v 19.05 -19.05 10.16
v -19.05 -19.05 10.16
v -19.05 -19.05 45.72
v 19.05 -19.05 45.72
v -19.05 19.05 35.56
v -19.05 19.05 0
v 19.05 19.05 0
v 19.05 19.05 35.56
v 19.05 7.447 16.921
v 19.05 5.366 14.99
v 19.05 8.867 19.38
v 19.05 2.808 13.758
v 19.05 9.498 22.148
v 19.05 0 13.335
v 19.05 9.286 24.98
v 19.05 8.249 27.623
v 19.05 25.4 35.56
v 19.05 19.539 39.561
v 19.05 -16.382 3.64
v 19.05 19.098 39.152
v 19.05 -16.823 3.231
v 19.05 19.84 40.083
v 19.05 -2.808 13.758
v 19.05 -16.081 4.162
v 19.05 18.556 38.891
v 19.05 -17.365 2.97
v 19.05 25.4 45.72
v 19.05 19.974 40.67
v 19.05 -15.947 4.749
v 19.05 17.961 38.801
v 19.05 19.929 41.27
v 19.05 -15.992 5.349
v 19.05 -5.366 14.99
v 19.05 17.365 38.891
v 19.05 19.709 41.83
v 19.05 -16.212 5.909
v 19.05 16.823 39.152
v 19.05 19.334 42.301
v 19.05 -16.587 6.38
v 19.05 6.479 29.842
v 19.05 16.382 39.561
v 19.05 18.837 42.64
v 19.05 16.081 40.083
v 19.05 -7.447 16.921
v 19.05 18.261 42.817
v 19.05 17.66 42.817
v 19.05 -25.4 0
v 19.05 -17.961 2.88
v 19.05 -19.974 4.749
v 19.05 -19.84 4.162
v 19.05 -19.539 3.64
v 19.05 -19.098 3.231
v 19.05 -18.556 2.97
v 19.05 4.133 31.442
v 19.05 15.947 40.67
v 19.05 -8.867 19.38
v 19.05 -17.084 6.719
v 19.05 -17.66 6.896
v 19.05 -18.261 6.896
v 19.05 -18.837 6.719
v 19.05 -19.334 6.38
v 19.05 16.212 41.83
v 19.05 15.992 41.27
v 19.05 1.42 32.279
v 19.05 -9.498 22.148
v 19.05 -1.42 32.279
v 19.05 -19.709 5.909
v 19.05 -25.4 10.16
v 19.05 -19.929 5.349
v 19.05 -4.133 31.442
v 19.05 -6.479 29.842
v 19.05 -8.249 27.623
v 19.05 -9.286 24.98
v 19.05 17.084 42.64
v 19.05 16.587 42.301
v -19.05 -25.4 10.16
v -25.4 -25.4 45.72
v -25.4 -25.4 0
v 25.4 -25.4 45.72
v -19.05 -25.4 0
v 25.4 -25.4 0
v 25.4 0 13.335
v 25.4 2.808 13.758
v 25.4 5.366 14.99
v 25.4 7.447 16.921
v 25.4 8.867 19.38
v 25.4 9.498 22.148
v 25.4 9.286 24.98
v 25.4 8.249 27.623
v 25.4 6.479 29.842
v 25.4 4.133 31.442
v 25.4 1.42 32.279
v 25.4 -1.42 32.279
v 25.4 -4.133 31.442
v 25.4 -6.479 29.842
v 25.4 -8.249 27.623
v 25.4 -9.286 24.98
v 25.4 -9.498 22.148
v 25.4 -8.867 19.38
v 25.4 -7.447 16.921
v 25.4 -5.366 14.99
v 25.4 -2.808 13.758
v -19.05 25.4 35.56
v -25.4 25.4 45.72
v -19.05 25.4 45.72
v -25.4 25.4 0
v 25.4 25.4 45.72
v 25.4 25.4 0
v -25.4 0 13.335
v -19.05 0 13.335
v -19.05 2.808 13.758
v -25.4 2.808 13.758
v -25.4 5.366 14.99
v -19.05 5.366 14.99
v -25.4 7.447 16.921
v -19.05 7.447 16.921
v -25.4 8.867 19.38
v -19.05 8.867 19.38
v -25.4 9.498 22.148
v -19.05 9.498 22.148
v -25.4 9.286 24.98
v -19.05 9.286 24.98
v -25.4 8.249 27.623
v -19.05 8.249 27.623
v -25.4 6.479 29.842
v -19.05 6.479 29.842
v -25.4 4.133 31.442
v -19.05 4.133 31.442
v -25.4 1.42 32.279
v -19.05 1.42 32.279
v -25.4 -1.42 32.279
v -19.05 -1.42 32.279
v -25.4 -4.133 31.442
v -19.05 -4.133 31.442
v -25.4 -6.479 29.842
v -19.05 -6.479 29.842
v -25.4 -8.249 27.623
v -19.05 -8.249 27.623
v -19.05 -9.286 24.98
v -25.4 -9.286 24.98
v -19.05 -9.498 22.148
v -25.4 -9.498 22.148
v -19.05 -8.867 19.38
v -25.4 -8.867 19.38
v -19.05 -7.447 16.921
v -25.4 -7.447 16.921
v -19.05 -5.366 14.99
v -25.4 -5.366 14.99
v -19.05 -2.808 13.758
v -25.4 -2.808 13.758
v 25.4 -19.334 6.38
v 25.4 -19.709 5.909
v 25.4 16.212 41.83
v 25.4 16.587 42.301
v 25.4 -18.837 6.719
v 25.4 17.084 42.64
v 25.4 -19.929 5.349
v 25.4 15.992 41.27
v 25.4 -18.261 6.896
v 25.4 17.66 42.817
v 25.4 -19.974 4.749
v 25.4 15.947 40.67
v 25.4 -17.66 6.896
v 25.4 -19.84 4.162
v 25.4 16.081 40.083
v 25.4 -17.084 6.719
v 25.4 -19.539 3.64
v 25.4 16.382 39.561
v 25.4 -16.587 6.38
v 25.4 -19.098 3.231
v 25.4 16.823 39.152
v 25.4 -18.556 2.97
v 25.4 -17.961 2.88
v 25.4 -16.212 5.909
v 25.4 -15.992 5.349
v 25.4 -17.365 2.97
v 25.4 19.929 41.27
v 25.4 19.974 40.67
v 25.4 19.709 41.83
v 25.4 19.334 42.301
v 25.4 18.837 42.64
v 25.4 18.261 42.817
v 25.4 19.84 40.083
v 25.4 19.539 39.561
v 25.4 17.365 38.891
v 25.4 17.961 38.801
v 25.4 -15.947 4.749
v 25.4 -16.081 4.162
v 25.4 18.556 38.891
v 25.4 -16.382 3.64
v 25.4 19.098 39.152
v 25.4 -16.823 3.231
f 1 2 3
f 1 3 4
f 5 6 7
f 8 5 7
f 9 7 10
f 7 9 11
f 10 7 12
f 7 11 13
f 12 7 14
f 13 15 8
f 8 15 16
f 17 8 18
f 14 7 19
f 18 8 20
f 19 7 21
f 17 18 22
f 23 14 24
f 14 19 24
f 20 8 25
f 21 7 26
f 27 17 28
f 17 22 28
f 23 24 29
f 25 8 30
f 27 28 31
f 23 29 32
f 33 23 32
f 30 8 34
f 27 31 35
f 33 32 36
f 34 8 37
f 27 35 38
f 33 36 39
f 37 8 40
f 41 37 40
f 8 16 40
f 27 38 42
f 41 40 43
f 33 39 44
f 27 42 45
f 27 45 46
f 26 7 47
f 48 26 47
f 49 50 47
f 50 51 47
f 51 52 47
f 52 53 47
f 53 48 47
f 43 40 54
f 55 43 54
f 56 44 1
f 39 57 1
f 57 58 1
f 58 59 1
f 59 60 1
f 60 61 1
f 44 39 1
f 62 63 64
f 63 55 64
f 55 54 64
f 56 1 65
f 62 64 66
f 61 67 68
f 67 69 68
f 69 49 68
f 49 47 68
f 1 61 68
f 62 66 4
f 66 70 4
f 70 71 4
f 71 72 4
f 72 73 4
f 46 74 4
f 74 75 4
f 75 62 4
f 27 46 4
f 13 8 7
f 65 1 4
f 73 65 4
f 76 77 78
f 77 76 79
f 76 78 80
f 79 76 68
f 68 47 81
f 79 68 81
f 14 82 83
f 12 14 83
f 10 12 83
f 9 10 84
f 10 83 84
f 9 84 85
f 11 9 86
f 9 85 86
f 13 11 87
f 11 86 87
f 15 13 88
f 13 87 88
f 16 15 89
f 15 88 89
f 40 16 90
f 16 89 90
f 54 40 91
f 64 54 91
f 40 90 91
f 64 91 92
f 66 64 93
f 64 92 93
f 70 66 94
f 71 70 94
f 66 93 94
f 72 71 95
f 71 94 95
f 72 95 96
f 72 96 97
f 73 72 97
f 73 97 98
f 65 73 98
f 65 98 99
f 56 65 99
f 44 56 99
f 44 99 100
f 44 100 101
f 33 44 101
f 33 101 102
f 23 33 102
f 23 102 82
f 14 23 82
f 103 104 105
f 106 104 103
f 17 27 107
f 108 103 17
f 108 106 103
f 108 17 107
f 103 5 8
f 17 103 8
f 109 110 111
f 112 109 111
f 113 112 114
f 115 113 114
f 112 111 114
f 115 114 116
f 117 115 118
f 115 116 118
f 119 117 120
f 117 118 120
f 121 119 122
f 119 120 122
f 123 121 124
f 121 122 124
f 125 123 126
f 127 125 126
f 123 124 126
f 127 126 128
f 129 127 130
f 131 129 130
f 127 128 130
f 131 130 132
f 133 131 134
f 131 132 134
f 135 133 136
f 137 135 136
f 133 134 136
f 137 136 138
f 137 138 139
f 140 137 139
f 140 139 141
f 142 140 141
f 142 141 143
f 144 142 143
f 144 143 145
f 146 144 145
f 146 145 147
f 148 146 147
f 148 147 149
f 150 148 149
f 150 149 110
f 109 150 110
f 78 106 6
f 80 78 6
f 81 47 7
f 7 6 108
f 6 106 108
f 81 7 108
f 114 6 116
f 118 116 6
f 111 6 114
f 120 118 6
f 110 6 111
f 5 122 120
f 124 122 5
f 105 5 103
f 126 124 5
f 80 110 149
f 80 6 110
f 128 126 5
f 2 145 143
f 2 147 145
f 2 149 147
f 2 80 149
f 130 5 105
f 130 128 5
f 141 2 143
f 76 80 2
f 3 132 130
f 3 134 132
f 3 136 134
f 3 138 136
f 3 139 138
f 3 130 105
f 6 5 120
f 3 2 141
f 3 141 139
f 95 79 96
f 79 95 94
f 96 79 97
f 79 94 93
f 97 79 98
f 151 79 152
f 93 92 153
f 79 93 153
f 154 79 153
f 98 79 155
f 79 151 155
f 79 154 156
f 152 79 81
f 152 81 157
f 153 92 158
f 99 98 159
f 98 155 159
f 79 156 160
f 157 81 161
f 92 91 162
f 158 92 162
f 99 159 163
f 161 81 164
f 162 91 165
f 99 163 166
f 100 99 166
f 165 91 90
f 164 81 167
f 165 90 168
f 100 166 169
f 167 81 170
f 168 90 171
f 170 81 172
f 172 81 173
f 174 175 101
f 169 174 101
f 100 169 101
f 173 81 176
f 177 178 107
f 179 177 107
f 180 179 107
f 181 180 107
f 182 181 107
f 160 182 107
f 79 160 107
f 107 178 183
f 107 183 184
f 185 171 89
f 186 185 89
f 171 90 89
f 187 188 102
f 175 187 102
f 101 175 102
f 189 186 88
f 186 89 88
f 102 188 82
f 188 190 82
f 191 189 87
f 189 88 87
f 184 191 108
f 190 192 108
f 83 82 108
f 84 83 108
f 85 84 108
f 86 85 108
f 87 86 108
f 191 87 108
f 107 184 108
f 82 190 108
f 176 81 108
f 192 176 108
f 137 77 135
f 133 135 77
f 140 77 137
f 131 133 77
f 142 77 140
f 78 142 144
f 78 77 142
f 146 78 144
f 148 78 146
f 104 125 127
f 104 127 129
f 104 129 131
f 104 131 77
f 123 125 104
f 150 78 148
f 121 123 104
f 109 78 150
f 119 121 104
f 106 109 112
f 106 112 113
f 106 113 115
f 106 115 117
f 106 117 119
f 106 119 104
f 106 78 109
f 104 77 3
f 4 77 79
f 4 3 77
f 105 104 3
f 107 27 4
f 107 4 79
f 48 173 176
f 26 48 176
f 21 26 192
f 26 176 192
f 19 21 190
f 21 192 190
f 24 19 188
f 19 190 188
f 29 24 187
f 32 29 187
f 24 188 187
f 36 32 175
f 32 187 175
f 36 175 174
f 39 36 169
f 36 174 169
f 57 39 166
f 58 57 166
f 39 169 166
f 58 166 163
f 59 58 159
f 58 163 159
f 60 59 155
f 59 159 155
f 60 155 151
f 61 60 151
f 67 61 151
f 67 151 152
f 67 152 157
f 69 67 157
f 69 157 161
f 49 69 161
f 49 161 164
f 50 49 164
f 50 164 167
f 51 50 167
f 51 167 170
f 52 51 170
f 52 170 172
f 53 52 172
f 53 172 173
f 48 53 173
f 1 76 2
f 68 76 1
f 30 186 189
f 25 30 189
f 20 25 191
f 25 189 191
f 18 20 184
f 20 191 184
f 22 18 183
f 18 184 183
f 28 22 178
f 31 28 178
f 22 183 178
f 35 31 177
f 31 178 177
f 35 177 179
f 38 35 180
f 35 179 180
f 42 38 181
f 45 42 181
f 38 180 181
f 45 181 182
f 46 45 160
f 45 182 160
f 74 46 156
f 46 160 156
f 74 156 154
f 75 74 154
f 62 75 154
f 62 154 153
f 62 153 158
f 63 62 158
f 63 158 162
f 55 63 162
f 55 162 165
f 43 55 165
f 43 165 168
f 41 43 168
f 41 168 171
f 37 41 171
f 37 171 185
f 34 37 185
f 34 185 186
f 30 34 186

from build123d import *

# Parameters (mm, degrees)
SKETCH1_W                      = 50.8
SKETCH1_H                      = 50.8
SKETCH1_W_2                    = 38.1
SKETCH1_H_2                    = 38.1
EXTRUDE_THIN1_DEPTH            = 45.72
SKETCH2_R                      = 2.0193
CUT_EXTRUDE2_DEPTH             = 1
CUT_EXTRUDE2_DEPTH_BACK        = 6.35
SKETCH4_R                      = 9.525
CUT_EXTRUDE3_DEPTH             = 1
CUT_EXTRUDE3_DEPTH_BACK        = 51.8
CUT_EXTRUDE4_REACH             = 52.8
SKETCH5_W                      = 38.1
SKETCH5_H                      = 10.16
CUT_EXTRUDE4_DIRECTION_2_DEPTH = 1
CUT_EXTRUDE5_START             = -25.4
SKETCH5_3_W                    = 38.1
SKETCH5_3_H                    = 10.16
CUT_EXTRUDE5_DEPTH             = 25.4


with BuildPart() as part:
    # Sketch1 → Extrude-Thin1 (new body)
    with BuildSketch(Plane.XY):
        Rectangle(SKETCH1_W, SKETCH1_H)
        Rectangle(SKETCH1_W_2, SKETCH1_H_2, mode=Mode.SUBTRACT)
    extrude(amount=EXTRUDE_THIN1_DEPTH)

    # Sketch2 → Cut-Extrude2 (cut, two sides)
    with BuildSketch(Plane(origin=(25.4, 0, 0), x_dir=(0, 0, -1), z_dir=(1, 0, 0))) as cut_extrude2_sk:
        with Locations((-40.820512212, 17.96051224)):
            Circle(SKETCH2_R)
        with Locations((-4.899487788, -17.96051224)):
            Circle(SKETCH2_R)
    extrude(amount=CUT_EXTRUDE2_DEPTH, mode=Mode.SUBTRACT)
    extrude(cut_extrude2_sk.sketch, amount=-CUT_EXTRUDE2_DEPTH_BACK, mode=Mode.SUBTRACT)

    # Sketch4 → Cut-Extrude3 (cut, two sides)
    with BuildSketch(Plane(origin=(25.4, 0, 0), x_dir=(0, 0, -1), z_dir=(1, 0, 0))) as cut_extrude3_sk:
        with Locations((-22.86, 0)):
            Circle(SKETCH4_R)
    extrude(amount=CUT_EXTRUDE3_DEPTH, mode=Mode.SUBTRACT)
    extrude(cut_extrude3_sk.sketch, amount=-CUT_EXTRUDE3_DEPTH_BACK, mode=Mode.SUBTRACT)

    # Sketch5 → Cut-Extrude4 (cut, up to next)
    with BuildSketch(Plane.XZ.offset(25.4), mode=Mode.PRIVATE) as cut_extrude4_sk1:
        with Locations((0, 5.08)):
            Rectangle(SKETCH5_W, SKETCH5_H)
    cut_extrude4_tool1 = extrude(cut_extrude4_sk1.sketch, amount=-CUT_EXTRUDE4_REACH, mode=Mode.PRIVATE) & part.part
    add(cut_extrude4_tool1.solids().sort_by_distance((0, -25.4, 5.08))[0], mode=Mode.SUBTRACT)

    # Sketch5 → Cut-Extrude4 direction 2 (cut)
    with BuildSketch(Plane.XZ.offset(25.4)):
        with Locations((0, 5.08)):
            Rectangle(SKETCH5_W, SKETCH5_H)
    extrude(amount=CUT_EXTRUDE4_DIRECTION_2_DEPTH, mode=Mode.SUBTRACT)

    # Sketch5<3> → Cut-Extrude5 (cut)
    with BuildSketch(Plane.XZ.offset(25.4).offset(CUT_EXTRUDE5_START)):
        with Locations((0, 40.64)):
            Rectangle(SKETCH5_3_W, SKETCH5_3_H)
    extrude(amount=-CUT_EXTRUDE5_DEPTH, mode=Mode.SUBTRACT)


solid = part.part
